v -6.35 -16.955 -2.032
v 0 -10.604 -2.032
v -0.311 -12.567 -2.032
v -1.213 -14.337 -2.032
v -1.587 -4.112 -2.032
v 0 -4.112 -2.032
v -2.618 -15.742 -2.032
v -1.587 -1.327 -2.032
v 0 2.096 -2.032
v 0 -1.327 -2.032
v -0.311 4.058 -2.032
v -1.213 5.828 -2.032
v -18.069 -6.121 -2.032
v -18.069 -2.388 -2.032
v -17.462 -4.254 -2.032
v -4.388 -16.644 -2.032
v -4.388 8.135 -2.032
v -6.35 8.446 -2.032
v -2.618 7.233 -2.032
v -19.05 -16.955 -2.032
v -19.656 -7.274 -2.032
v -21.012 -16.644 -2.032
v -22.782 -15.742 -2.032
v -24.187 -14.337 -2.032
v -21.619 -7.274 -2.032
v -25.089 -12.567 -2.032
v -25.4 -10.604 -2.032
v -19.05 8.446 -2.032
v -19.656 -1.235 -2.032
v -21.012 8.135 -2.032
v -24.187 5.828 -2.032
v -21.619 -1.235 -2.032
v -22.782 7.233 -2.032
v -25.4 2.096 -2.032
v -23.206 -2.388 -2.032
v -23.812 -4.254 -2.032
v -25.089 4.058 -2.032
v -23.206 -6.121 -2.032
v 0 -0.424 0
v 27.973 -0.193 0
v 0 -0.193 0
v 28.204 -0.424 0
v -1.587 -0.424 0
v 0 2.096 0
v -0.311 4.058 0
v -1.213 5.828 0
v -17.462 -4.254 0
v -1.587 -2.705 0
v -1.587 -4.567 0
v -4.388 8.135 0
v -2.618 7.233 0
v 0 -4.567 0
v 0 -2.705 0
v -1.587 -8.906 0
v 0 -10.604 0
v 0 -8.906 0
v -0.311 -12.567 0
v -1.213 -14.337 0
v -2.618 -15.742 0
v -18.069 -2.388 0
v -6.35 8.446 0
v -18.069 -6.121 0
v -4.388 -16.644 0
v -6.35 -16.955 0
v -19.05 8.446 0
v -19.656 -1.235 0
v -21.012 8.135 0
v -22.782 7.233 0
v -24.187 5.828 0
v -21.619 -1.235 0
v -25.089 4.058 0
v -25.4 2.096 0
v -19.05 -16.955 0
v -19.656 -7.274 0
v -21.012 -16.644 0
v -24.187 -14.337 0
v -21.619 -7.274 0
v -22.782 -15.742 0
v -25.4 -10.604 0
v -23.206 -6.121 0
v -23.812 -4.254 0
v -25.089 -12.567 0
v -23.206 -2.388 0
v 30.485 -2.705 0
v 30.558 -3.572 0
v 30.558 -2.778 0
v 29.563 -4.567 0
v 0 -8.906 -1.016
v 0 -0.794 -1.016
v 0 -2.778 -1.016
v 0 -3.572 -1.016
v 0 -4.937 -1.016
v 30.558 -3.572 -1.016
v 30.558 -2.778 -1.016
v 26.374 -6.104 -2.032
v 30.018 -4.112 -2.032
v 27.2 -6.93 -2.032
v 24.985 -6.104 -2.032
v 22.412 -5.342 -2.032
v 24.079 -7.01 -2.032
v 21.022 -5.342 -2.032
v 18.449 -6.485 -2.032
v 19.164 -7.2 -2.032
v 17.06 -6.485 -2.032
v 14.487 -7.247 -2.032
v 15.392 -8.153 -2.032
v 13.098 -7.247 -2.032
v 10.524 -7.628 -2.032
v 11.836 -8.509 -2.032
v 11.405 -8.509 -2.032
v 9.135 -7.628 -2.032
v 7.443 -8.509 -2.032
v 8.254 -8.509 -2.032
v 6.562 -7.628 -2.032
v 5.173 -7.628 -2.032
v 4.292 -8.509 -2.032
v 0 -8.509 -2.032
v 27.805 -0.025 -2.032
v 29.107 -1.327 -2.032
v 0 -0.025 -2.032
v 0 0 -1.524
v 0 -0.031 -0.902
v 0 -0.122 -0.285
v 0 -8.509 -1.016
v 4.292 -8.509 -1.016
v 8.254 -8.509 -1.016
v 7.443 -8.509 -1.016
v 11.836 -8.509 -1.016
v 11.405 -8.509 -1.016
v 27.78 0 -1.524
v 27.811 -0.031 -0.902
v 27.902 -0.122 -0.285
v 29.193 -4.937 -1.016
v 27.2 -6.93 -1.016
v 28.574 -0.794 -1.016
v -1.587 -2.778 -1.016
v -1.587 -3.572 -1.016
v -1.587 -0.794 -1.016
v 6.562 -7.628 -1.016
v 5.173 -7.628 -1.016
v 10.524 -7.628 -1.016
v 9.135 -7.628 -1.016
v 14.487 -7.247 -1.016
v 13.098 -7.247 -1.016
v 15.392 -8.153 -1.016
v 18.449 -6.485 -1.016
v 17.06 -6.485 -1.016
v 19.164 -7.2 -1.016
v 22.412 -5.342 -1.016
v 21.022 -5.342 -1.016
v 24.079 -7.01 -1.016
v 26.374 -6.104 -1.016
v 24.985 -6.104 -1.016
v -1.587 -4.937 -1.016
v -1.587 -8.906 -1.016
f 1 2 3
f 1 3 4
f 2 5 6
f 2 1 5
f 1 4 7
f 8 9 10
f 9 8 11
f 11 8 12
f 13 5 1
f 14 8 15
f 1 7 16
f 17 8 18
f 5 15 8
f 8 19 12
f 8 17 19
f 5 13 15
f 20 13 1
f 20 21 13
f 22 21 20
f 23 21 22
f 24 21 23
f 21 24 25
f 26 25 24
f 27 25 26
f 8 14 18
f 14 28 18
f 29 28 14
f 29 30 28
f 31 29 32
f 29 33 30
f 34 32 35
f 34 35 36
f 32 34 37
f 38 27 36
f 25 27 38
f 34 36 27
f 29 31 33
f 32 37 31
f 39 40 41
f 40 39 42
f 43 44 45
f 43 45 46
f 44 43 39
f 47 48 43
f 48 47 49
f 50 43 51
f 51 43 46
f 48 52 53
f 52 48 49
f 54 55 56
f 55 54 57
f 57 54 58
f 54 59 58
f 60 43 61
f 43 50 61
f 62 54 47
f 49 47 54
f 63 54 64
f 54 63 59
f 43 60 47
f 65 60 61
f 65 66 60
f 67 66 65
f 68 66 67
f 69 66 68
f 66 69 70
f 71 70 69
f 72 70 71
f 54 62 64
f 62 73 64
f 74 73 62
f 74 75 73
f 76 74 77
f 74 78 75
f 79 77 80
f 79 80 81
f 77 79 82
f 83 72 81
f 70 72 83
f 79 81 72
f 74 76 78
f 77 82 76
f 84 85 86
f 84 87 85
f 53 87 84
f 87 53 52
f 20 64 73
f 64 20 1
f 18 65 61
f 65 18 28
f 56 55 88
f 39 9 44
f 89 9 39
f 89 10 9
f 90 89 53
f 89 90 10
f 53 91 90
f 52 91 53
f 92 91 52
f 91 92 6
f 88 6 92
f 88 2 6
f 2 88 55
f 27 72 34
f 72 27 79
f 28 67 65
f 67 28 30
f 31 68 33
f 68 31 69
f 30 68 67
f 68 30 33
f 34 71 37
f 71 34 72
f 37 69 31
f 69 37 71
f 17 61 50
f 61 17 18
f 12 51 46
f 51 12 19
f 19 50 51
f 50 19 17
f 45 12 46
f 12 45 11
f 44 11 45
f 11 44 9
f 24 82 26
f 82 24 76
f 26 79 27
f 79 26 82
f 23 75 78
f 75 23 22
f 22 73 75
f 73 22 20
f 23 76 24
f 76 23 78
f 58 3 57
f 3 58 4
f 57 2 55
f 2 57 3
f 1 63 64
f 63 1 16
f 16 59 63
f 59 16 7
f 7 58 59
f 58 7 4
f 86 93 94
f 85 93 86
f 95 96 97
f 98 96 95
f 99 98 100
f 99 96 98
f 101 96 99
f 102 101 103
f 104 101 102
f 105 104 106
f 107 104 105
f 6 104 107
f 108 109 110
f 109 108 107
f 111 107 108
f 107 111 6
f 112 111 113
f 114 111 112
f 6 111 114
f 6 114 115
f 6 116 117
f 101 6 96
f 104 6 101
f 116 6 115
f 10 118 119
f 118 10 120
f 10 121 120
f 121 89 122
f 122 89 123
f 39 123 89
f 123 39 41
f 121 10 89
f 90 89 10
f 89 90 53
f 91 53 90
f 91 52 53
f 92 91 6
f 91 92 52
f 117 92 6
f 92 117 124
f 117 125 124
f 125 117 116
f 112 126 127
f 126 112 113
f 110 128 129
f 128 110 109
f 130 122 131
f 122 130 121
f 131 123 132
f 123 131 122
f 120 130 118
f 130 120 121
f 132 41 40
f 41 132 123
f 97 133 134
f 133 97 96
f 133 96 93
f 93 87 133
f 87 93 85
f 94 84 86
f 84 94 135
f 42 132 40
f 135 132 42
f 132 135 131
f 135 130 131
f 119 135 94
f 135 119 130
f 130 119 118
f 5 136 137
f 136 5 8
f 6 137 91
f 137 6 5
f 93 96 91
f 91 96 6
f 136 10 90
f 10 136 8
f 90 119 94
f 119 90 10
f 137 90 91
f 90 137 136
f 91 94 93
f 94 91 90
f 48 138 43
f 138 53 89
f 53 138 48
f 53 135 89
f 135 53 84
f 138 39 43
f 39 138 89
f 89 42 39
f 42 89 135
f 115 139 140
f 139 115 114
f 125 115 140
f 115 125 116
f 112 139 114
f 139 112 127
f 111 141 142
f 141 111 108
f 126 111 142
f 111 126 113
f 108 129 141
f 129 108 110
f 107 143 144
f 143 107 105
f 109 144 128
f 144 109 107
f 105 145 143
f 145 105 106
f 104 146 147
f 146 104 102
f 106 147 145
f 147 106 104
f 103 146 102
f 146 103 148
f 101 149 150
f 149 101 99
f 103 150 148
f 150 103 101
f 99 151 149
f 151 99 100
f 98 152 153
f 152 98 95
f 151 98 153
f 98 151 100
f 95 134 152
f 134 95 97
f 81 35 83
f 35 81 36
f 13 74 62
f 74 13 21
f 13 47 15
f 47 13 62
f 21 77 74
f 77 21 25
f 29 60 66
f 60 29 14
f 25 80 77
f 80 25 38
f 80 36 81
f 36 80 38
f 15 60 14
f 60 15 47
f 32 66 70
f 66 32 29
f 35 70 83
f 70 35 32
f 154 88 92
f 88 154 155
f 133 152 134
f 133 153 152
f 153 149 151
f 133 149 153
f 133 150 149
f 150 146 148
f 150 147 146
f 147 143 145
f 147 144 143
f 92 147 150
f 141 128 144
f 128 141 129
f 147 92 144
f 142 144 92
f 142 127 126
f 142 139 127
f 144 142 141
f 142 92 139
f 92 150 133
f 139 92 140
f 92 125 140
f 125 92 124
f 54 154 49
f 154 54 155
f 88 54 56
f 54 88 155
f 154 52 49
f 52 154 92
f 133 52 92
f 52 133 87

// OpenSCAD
// Physical Keygen - by Nirav Patel <http://eclecti.cc>
//
// Generate a duplicate of a Schlage SC1 key by editing the last line of the file
// and entering in the key code of the lock.  If you don't know the key code,
// you can measure the key and compare the numbers at:
// http://web.archive.org/web/20050217020917fw_/http://dlaco.com/spacing/tips.htm
//
// This work is licensed under a Creative Commons Attribution 3.0 Unported License.

// Since the keys and locks I have were all designed in imperial units, the
// constants in this file will be defined in inches.  The mm function
// allows us to retain the proper size for exporting a metric STL.
function mm(i) = i*25.4;

//(cut closest to tip of key)
cut_1 = 5; //[0:9]

//
cut_2 = 7; //[0:9]

//
cut_3 = 4; //[0:9]

//
cut_4 = 2; //[0:9]

//
cut_5 = 1; //[0:9]

//(cut closest to grip/bow of key)
cut_6 = 1; //[0:9]

module rounded(size, r) {
    union() {
        translate([r, 0, 0]) cube([size[0]-2*r, size[1], size[2]]);
        translate([0, r, 0]) cube([size[0], size[1]-2*r, size[2]]);
        translate([r, r, 0]) cylinder(h=size[2], r=r);
        translate([size[0]-r, r, 0]) cylinder(h=size[2], r=r);
        translate([r, size[1]-r, 0]) cylinder(h=size[2], r=r);
        translate([size[0]-r, size[1]-r, 0]) cylinder(h=size[2], r=r);
    }
}

module bit() {
    w = mm(1/4);
    difference() {
        translate([-w/2, 0, 0]) cube([w, mm(1), w]);
        translate([-mm(7/256), 0, 0]) rotate([0, 0, 135]) cube([w, w, w]);
         translate([mm(7/256), 0, 0]) rotate([0, 0, -45]) cube([w, w, w]);
    }
}

// Schlage SC1 5 pin key.  The measurements are mostly guesses based on reverse
// engineering some keys I have and some publicly available information.
module sc1(bits) {
    // You may need to adjust these to fit your specific printer settings
    thickness = mm(0.080);
    length = mm(1.2187);
    width = mm(.335);
    
    shoulder = mm(.231);
    pin_spacing = mm(.156);
    depth_inc = mm(.015);
    
    // A fudge factor.  Printing with your average RepRap, the bottom layer is
    // going to be squeezed larger than you want. You can make the pins
    // go slighly deeper by a fudge amount to make up for it if you aren't
    // adjusting for it elsewhere like Skeinforge or in your firmware.
    // 0.5mm works well for me.
    fudge = 0.5;
    
    // Handle size
    h_l = mm(1);
    h_w = mm(1);
    h_d = mm(1/16);
    difference() {
        // blade and key handle
        union() {
            translate([-h_l, -h_w/2 + width/2, 0]) rounded([h_l, h_w, thickness], mm(1/4));
            intersection() {
                // cut a little off the tip to avoid going too long
                cube([length - mm(1/64), width, thickness]);
                translate([0, mm(1/4), thickness*3/4]) rotate([0, 90, 0]) cylinder(h=length, r=mm(1/4), $fn=64);
            }
        }
        
        // chamfer the tip
        translate([length, mm(1/8), 0]) {
            rotate([0, 0, 45]) cube([10, 10, thickness]);
            rotate([0, 0, 225]) cube([10, 10, thickness]);
        }
        
        // put in a hole for keychain use
        translate([-h_l + mm(3/16), width/2, 0]) cylinder(h=thickness, r=mm(1/8));
        
        // cut the channels in the key.  designed more for printability than accuracy
        union() {
            translate([-h_d, mm(9/64), thickness/2]) rotate([62, 0, 0]) cube([length + h_d, width, width]);
            translate([-h_d, mm(7/64), thickness/2]) rotate([55, 0, 0]) cube([length + h_d, width, width]);
            translate([-h_d, mm(7/64), thickness/2]) cube([length + h_d, mm(1/32), width]);
        }
        
        translate([-h_d, width - mm(9/64), 0]) cube([length + h_d, width - (width - mm(10/64)), thickness/2]);
        translate([-h_d, width - mm(9/64), thickness/2]) rotate([-110, 0, 0]) cube([length + h_d, width, thickness/2]);
        
        intersection() {
            translate([-h_d, mm(1/32), thickness/2]) rotate([-118, 0, 0]) cube([length + h_d, width, width]);
            translate([-h_d, mm(1/32), thickness/2]) rotate([-110, 0, 0]) cube([length + h_d, width, width]);
        }
        
        // Do the actual bitting
        for (b = [0:5]) {
            translate([shoulder + b*pin_spacing, width - bits[b]*depth_inc - fudge, 0]) bit();
        }
    }
}

// This sample key goes to a lock that is sitting disassembled on my desk
// Flip the key over for easy printing
rotate([180, 0, 0]) sc1([cut_6,cut_5,cut_4,cut_3,cut_2,cut_1]);
